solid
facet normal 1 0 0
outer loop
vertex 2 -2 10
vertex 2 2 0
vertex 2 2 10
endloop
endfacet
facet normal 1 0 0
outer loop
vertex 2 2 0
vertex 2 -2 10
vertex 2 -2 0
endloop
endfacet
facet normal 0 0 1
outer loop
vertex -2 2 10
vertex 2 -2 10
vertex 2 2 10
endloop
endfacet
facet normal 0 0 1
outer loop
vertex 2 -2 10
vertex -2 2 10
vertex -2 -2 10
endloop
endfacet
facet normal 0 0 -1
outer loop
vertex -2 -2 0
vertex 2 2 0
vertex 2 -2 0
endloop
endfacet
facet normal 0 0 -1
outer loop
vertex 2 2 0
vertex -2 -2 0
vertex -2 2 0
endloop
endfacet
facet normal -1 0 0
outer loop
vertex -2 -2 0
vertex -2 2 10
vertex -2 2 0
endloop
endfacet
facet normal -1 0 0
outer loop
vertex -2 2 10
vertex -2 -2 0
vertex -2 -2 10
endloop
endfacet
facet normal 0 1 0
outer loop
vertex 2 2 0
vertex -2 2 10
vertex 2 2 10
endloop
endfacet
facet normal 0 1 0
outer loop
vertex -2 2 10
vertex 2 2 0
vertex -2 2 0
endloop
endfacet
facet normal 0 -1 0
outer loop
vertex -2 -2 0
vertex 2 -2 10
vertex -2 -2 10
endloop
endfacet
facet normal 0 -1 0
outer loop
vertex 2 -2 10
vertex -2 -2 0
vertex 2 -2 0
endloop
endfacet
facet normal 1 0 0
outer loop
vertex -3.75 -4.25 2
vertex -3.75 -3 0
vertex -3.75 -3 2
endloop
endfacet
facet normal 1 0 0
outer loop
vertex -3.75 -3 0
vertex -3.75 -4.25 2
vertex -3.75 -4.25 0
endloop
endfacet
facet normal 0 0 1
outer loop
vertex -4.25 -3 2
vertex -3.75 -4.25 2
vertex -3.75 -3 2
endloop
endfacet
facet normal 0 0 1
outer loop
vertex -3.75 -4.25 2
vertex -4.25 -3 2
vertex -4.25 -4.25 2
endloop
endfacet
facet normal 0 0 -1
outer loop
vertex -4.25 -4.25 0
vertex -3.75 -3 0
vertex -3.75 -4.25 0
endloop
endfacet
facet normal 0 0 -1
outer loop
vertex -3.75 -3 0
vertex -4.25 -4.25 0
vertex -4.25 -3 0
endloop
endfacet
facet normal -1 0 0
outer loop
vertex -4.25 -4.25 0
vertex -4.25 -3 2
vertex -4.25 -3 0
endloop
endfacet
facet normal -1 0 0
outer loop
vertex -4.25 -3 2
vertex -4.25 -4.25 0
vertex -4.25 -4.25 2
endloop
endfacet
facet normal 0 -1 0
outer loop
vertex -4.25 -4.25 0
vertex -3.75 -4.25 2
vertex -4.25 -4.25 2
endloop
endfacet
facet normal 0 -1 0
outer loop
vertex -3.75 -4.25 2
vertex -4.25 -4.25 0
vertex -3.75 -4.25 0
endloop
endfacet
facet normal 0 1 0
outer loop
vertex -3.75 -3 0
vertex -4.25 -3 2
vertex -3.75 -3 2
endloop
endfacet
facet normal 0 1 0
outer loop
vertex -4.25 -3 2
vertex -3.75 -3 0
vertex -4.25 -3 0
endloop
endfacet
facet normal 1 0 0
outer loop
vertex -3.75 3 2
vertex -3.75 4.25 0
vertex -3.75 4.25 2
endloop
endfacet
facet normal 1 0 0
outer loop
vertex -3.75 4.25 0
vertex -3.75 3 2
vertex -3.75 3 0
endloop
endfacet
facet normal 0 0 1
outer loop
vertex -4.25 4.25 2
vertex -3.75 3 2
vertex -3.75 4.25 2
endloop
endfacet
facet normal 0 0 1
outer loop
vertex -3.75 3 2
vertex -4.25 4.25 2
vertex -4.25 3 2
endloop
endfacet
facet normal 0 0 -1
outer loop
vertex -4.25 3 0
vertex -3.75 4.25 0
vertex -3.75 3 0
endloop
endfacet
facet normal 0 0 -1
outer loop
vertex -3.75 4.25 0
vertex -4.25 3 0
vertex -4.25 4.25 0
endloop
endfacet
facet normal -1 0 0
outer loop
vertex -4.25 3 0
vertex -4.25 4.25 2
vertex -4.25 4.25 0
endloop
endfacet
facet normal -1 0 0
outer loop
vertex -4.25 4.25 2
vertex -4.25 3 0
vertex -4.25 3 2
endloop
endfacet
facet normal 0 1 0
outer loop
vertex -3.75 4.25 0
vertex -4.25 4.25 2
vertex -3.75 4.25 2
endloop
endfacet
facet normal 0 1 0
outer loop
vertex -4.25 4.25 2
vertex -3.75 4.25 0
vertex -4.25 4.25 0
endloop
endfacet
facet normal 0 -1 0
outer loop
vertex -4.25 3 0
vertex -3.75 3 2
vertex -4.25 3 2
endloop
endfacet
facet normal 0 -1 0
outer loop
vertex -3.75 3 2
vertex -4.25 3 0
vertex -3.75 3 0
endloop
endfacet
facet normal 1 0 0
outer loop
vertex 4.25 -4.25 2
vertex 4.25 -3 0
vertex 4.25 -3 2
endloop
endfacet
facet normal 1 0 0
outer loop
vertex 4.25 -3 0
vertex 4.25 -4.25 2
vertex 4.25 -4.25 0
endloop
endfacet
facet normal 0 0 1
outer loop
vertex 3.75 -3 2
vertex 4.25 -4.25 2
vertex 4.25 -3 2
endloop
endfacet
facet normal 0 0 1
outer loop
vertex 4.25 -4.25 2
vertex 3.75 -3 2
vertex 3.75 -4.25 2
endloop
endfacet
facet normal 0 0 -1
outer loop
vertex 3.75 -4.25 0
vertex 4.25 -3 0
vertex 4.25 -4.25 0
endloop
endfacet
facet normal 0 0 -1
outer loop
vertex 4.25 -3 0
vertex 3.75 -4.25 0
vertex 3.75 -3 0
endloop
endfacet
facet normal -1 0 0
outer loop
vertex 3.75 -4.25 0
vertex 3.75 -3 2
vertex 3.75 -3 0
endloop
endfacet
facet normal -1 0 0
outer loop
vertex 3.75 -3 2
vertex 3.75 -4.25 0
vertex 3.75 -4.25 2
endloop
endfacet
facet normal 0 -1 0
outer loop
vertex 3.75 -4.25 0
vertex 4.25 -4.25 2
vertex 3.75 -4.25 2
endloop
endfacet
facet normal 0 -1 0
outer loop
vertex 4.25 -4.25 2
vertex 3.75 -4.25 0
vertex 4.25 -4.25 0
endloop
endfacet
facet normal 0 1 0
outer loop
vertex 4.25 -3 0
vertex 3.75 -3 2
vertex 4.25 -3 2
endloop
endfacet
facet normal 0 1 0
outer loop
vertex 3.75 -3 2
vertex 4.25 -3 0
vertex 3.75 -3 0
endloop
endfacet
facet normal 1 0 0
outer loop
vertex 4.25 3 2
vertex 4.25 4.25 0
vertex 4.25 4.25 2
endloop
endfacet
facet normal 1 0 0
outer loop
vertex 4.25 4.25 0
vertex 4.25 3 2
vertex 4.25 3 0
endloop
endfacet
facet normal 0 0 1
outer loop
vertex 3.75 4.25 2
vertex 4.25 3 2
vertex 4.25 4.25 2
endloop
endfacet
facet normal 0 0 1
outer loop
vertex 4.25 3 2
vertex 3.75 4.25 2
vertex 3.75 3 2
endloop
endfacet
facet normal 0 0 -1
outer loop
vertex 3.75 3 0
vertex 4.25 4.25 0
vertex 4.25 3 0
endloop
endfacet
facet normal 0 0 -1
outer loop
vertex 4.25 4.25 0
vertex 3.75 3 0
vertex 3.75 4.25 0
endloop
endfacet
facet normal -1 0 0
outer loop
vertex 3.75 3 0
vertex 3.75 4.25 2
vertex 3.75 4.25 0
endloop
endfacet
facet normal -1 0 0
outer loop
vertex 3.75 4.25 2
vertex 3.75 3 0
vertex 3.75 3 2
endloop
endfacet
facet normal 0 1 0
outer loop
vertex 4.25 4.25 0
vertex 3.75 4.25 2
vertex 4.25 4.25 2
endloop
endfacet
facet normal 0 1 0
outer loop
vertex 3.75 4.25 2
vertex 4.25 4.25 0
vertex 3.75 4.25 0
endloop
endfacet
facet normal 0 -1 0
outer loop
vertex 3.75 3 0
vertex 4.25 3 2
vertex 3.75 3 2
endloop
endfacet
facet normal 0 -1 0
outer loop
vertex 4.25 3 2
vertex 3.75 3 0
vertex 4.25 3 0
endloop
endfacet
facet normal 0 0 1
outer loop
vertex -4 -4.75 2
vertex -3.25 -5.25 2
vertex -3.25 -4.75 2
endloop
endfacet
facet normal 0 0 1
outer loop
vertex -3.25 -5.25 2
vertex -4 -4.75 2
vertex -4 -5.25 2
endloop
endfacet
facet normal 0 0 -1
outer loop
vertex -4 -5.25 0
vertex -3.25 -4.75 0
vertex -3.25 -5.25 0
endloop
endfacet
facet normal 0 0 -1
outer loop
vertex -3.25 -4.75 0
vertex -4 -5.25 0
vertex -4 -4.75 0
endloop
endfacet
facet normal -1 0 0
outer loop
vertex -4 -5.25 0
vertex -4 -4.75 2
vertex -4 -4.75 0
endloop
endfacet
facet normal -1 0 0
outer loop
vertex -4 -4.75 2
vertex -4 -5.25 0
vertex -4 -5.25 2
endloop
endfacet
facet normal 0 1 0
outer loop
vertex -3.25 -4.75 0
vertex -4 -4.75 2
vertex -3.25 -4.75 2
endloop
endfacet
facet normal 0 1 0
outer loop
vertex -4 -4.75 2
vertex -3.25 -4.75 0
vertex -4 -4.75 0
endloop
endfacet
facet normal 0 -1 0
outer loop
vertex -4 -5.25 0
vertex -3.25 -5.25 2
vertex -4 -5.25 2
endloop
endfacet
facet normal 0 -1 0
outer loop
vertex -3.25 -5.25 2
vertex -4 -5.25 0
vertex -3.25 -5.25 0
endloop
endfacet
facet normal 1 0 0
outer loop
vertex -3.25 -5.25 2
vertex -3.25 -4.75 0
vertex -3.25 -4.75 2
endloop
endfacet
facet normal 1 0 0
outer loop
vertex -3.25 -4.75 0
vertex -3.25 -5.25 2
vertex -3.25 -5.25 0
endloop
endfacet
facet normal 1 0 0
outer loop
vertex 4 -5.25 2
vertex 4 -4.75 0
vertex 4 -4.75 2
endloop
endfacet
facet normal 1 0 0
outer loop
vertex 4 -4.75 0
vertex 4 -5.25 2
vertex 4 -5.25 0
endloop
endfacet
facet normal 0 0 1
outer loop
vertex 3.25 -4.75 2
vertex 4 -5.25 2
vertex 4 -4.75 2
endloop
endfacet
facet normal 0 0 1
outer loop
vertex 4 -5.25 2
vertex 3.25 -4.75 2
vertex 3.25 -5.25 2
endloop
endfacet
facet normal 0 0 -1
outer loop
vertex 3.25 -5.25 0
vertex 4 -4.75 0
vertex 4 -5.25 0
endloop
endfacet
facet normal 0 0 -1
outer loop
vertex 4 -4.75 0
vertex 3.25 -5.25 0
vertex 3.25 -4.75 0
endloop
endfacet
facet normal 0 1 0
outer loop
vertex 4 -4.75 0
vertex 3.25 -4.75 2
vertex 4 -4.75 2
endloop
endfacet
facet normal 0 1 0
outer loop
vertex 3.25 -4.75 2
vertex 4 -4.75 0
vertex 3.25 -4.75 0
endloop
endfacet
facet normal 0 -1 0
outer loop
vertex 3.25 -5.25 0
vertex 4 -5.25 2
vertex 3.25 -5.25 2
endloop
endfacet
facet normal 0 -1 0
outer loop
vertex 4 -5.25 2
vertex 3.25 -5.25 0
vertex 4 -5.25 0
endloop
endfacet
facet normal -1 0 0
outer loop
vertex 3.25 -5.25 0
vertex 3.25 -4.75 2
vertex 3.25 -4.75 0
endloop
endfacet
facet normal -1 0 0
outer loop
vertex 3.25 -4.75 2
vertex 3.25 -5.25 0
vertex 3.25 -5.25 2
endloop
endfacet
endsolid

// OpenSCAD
translate([0, 0, 5]) color([0,1,0,0.9]) cube([4, 4, 10], center=true);
translate([-4.0, -4.0, 1]) color([1,0,0]) cube([0.5, 0.5, 2], center=true);
translate([-4.0, -3.75, 1]) color([1,0,0]) cube([0.5, 0.5, 2], center=true);
translate([-4.0, -3.5, 1]) color([1,0,0]) cube([0.5, 0.5, 2], center=true);
translate([-4.0, -3.25, 1]) color([1,0,0]) cube([0.5, 0.5, 2], center=true);
translate([-4.0, 4.0, 1]) color([1,0,0]) cube([0.5, 0.5, 2], center=true);
translate([-4.0, 3.75, 1]) color([1,0,0]) cube([0.5, 0.5, 2], center=true);
translate([-4.0, 3.5, 1]) color([1,0,0]) cube([0.5, 0.5, 2], center=true);
translate([-4.0, 3.25, 1]) color([1,0,0]) cube([0.5, 0.5, 2], center=true);
translate([4.0, -4.0, 1]) color([1,0,0]) cube([0.5, 0.5, 2], center=true);
translate([4.0, -3.75, 1]) color([1,0,0]) cube([0.5, 0.5, 2], center=true);
translate([4.0, -3.5, 1]) color([1,0,0]) cube([0.5, 0.5, 2], center=true);
translate([4.0, -3.25, 1]) color([1,0,0]) cube([0.5, 0.5, 2], center=true);
translate([4.0, 4.0, 1]) color([1,0,0]) cube([0.5, 0.5, 2], center=true);
translate([4.0, 3.75, 1]) color([1,0,0]) cube([0.5, 0.5, 2], center=true);
translate([4.0, 3.5, 1]) color([1,0,0]) cube([0.5, 0.5, 2], center=true);
translate([4.0, 3.25, 1]) color([1,0,0]) cube([0.5, 0.5, 2], center=true);
translate([-3.75, -5.0, 1]) color([1,0,0]) cube([0.5, 0.5, 2], center=true);
translate([-3.5, -5.0, 1]) color([1,0,0]) cube([0.5, 0.5, 2], center=true);
translate([3.75, -5.0, 1]) color([1,0,0]) cube([0.5, 0.5, 2], center=true);
translate([3.5, -5.0, 1]) color([1,0,0]) cube([0.5, 0.5, 2], center=true);
